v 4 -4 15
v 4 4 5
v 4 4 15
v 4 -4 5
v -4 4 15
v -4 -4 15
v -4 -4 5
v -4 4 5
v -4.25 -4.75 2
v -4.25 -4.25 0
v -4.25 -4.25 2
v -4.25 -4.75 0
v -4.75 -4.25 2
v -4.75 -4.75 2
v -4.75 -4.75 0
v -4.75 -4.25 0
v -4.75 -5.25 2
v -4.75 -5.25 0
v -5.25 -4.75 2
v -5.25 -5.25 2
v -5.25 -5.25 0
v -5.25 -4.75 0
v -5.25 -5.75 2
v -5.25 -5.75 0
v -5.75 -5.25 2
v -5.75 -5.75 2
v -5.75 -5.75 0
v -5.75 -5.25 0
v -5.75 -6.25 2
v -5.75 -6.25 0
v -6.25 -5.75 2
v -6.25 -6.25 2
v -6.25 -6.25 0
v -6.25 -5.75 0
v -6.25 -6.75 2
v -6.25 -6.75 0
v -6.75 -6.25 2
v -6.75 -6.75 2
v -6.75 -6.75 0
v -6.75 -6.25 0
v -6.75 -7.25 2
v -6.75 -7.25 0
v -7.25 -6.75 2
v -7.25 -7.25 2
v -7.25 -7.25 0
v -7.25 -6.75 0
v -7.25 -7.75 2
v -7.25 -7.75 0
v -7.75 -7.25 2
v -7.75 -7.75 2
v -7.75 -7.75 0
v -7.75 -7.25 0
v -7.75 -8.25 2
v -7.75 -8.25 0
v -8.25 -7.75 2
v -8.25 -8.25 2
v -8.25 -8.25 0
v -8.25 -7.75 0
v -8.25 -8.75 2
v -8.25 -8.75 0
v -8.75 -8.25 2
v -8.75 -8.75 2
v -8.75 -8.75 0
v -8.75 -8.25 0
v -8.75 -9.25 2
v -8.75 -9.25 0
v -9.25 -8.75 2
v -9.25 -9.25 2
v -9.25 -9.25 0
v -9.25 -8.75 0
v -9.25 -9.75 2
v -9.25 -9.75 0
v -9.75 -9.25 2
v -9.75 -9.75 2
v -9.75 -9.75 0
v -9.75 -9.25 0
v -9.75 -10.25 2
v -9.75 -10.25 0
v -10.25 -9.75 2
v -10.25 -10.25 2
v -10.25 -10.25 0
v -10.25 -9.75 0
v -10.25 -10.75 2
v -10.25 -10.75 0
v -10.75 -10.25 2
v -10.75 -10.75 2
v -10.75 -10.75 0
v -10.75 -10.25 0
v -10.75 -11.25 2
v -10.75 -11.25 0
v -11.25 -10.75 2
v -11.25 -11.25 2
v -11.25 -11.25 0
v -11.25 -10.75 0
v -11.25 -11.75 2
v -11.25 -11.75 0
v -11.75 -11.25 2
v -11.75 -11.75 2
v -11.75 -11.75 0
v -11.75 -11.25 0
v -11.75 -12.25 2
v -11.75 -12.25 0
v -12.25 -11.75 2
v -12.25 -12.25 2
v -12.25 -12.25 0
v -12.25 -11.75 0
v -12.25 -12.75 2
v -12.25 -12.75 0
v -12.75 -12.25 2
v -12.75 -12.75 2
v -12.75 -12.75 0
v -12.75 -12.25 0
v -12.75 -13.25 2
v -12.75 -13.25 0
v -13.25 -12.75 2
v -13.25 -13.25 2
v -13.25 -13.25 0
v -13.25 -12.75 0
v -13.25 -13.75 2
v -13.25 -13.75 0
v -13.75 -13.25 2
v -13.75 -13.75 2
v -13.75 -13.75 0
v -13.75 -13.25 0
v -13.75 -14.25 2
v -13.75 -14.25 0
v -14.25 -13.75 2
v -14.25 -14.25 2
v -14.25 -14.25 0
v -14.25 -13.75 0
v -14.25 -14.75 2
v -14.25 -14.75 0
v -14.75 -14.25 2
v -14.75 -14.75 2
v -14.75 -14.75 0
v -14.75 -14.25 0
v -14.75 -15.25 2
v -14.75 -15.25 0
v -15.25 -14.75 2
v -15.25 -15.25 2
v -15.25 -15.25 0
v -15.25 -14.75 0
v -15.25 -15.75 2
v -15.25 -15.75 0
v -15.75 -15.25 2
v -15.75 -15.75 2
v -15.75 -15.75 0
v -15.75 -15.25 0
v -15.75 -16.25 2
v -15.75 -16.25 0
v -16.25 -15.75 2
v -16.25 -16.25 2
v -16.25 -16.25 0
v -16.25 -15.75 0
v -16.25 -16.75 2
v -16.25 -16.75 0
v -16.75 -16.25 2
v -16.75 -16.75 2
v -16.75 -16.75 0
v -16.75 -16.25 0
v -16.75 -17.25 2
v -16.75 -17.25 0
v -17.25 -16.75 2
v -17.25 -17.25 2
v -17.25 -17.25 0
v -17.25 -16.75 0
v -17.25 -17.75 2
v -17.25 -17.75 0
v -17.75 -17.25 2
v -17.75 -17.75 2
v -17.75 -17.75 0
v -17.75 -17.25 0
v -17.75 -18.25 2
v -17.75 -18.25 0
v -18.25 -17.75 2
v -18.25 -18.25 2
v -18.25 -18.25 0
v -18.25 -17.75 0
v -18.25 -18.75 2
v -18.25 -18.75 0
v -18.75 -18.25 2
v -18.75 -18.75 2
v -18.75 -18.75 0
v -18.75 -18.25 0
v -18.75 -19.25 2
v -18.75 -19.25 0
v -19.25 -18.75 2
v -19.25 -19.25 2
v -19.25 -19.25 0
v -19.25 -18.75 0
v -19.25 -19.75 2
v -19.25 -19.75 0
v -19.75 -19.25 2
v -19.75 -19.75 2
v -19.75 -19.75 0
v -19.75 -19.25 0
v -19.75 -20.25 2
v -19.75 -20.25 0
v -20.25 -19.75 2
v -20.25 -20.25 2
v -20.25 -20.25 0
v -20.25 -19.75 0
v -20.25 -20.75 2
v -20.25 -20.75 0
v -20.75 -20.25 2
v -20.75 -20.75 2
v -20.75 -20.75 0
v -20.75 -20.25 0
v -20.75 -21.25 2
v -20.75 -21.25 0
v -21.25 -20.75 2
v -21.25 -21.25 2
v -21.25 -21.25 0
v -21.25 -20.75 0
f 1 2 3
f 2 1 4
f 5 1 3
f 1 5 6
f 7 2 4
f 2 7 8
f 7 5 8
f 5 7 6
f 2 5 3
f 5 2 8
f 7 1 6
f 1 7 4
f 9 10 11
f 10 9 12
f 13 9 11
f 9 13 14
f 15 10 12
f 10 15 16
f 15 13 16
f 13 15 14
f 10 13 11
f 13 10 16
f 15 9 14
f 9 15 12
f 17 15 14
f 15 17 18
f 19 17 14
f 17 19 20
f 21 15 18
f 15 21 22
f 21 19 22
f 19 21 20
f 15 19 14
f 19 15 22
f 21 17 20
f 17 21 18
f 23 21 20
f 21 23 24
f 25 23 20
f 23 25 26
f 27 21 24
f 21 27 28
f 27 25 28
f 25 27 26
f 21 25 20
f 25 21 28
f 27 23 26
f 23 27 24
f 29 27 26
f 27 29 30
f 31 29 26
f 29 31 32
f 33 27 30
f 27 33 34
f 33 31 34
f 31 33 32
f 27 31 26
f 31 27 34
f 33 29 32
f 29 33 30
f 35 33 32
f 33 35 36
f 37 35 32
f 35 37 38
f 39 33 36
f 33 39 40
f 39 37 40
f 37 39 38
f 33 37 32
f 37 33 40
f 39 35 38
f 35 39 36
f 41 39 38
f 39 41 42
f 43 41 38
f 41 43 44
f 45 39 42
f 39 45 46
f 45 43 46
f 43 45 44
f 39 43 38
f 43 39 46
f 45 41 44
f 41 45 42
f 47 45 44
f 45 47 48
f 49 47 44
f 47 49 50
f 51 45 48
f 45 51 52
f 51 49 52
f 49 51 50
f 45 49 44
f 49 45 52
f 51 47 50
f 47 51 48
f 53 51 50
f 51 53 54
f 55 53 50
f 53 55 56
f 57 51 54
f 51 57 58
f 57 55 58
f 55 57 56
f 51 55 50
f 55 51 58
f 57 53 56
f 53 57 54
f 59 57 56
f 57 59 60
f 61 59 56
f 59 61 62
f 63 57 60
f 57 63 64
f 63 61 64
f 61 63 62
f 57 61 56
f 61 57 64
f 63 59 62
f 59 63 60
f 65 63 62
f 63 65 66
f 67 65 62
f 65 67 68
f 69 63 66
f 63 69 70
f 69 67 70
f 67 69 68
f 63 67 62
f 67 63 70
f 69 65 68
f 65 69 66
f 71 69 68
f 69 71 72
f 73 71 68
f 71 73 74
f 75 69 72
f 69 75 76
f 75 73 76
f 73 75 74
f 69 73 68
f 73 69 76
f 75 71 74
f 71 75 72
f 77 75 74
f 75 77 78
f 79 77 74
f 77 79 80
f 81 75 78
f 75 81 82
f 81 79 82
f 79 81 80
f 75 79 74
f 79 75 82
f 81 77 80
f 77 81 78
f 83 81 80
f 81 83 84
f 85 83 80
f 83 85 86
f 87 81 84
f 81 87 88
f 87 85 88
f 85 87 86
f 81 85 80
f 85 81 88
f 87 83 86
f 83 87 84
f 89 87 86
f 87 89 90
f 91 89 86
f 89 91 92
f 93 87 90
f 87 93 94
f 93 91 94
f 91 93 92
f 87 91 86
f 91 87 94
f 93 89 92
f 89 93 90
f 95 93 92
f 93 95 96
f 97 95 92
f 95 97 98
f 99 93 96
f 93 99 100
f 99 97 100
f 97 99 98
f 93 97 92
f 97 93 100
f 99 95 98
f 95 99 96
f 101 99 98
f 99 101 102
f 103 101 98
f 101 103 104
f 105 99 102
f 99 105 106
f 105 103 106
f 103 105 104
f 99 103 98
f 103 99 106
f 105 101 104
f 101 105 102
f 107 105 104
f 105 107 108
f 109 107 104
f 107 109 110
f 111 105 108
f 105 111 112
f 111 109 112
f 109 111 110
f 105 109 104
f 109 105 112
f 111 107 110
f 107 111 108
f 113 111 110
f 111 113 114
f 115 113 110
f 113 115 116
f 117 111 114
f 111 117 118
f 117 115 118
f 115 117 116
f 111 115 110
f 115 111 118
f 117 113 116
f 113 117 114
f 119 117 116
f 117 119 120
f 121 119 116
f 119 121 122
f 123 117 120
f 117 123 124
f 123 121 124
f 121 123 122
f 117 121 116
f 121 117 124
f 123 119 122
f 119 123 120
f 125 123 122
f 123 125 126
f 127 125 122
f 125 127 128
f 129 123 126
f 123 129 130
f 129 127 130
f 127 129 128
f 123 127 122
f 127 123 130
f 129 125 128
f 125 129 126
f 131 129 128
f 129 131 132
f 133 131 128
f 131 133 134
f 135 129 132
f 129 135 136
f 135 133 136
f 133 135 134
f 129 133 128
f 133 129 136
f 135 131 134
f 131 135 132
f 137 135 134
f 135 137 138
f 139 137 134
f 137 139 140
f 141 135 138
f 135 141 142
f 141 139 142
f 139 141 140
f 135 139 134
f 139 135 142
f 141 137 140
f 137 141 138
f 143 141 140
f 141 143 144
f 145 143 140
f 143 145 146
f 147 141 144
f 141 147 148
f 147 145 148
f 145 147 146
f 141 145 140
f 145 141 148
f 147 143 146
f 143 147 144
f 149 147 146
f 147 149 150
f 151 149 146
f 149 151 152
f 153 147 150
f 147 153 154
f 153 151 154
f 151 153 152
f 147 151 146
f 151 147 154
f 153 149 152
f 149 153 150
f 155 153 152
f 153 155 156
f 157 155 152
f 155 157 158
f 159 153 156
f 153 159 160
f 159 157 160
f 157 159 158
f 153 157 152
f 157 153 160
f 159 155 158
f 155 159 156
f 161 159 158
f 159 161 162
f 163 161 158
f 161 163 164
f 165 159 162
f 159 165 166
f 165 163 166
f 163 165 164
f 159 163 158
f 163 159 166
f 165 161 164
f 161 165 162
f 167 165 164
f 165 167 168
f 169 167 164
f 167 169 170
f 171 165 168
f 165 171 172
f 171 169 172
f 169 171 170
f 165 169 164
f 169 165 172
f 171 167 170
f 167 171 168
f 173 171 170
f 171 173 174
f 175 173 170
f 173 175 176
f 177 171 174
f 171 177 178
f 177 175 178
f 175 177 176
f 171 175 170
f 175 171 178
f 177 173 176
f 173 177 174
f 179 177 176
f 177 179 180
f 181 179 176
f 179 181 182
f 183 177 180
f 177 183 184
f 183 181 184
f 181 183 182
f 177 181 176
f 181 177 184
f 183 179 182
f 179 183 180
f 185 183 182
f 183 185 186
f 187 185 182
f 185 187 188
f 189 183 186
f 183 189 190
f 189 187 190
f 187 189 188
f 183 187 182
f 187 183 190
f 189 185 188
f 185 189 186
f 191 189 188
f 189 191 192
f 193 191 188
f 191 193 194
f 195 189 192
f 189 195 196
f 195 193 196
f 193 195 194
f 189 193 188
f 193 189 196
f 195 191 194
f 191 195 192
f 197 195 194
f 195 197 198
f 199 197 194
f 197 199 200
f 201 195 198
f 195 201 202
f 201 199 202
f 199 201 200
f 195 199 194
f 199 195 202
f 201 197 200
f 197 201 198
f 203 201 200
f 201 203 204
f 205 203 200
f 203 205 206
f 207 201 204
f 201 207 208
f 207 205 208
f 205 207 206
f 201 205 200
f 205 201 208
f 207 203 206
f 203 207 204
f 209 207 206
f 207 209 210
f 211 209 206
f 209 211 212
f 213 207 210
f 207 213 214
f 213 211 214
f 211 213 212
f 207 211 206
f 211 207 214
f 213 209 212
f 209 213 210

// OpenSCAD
translate([0, 0, 10]) color([0,1,0,0.9]) cube([8, 8, 10], center=true);
translate([-4.5, -4.5, 1]) color([1,0,0]) cube([0.5, 0.5, 2], center=true);
translate([-5, -5, 1]) color([1,0,0]) cube([0.5, 0.5, 2], center=true);
translate([-5.5, -5.5, 1]) color([1,0,0]) cube([0.5, 0.5, 2], center=true);
translate([-6, -6, 1]) color([1,0,0]) cube([0.5, 0.5, 2], center=true);
translate([-6.5, -6.5, 1]) color([1,0,0]) cube([0.5, 0.5, 2], center=true);
translate([-7, -7, 1]) color([1,0,0]) cube([0.5, 0.5, 2], center=true);
translate([-7.5, -7.5, 1]) color([1,0,0]) cube([0.5, 0.5, 2], center=true);
translate([-8, -8, 1]) color([1,0,0]) cube([0.5, 0.5, 2], center=true);
translate([-8.5, -8.5, 1]) color([1,0,0]) cube([0.5, 0.5, 2], center=true);
translate([-9, -9, 1]) color([1,0,0]) cube([0.5, 0.5, 2], center=true);
translate([-9.5, -9.5, 1]) color([1,0,0]) cube([0.5, 0.5, 2], center=true);
translate([-10, -10, 1]) color([1,0,0]) cube([0.5, 0.5, 2], center=true);
translate([-10.5, -10.5, 1]) color([1,0,0]) cube([0.5, 0.5, 2], center=true);
translate([-11, -11, 1]) color([1,0,0]) cube([0.5, 0.5, 2], center=true);
translate([-11.5, -11.5, 1]) color([1,0,0]) cube([0.5, 0.5, 2], center=true);
translate([-12, -12, 1]) color([1,0,0]) cube([0.5, 0.5, 2], center=true);
translate([-12.5, -12.5, 1]) color([1,0,0]) cube([0.5, 0.5, 2], center=true);
translate([-13, -13, 1]) color([1,0,0]) cube([0.5, 0.5, 2], center=true);
translate([-13.5, -13.5, 1]) color([1,0,0]) cube([0.5, 0.5, 2], center=true);
translate([-14, -14, 1]) color([1,0,0]) cube([0.5, 0.5, 2], center=true);
translate([-14.5, -14.5, 1]) color([1,0,0]) cube([0.5, 0.5, 2], center=true);
translate([-15, -15, 1]) color([1,0,0]) cube([0.5, 0.5, 2], center=true);
translate([-15.5, -15.5, 1]) color([1,0,0]) cube([0.5, 0.5, 2], center=true);
translate([-16, -16, 1]) color([1,0,0]) cube([0.5, 0.5, 2], center=true);
translate([-16.5, -16.5, 1]) color([1,0,0]) cube([0.5, 0.5, 2], center=true);
translate([-17, -17, 1]) color([1,0,0]) cube([0.5, 0.5, 2], center=true);
translate([-17.5, -17.5, 1]) color([1,0,0]) cube([0.5, 0.5, 2], center=true);
translate([-18, -18, 1]) color([1,0,0]) cube([0.5, 0.5, 2], center=true);
translate([-18.5, -18.5, 1]) color([1,0,0]) cube([0.5, 0.5, 2], center=true);
translate([-19, -19, 1]) color([1,0,0]) cube([0.5, 0.5, 2], center=true);
translate([-19.5, -19.5, 1]) color([1,0,0]) cube([0.5, 0.5, 2], center=true);
translate([-20, -20, 1]) color([1,0,0]) cube([0.5, 0.5, 2], center=true);
translate([-20.5, -20.5, 1]) color([1,0,0]) cube([0.5, 0.5, 2], center=true);
translate([-21, -21, 1]) color([1,0,0]) cube([0.5, 0.5, 2], center=true);
